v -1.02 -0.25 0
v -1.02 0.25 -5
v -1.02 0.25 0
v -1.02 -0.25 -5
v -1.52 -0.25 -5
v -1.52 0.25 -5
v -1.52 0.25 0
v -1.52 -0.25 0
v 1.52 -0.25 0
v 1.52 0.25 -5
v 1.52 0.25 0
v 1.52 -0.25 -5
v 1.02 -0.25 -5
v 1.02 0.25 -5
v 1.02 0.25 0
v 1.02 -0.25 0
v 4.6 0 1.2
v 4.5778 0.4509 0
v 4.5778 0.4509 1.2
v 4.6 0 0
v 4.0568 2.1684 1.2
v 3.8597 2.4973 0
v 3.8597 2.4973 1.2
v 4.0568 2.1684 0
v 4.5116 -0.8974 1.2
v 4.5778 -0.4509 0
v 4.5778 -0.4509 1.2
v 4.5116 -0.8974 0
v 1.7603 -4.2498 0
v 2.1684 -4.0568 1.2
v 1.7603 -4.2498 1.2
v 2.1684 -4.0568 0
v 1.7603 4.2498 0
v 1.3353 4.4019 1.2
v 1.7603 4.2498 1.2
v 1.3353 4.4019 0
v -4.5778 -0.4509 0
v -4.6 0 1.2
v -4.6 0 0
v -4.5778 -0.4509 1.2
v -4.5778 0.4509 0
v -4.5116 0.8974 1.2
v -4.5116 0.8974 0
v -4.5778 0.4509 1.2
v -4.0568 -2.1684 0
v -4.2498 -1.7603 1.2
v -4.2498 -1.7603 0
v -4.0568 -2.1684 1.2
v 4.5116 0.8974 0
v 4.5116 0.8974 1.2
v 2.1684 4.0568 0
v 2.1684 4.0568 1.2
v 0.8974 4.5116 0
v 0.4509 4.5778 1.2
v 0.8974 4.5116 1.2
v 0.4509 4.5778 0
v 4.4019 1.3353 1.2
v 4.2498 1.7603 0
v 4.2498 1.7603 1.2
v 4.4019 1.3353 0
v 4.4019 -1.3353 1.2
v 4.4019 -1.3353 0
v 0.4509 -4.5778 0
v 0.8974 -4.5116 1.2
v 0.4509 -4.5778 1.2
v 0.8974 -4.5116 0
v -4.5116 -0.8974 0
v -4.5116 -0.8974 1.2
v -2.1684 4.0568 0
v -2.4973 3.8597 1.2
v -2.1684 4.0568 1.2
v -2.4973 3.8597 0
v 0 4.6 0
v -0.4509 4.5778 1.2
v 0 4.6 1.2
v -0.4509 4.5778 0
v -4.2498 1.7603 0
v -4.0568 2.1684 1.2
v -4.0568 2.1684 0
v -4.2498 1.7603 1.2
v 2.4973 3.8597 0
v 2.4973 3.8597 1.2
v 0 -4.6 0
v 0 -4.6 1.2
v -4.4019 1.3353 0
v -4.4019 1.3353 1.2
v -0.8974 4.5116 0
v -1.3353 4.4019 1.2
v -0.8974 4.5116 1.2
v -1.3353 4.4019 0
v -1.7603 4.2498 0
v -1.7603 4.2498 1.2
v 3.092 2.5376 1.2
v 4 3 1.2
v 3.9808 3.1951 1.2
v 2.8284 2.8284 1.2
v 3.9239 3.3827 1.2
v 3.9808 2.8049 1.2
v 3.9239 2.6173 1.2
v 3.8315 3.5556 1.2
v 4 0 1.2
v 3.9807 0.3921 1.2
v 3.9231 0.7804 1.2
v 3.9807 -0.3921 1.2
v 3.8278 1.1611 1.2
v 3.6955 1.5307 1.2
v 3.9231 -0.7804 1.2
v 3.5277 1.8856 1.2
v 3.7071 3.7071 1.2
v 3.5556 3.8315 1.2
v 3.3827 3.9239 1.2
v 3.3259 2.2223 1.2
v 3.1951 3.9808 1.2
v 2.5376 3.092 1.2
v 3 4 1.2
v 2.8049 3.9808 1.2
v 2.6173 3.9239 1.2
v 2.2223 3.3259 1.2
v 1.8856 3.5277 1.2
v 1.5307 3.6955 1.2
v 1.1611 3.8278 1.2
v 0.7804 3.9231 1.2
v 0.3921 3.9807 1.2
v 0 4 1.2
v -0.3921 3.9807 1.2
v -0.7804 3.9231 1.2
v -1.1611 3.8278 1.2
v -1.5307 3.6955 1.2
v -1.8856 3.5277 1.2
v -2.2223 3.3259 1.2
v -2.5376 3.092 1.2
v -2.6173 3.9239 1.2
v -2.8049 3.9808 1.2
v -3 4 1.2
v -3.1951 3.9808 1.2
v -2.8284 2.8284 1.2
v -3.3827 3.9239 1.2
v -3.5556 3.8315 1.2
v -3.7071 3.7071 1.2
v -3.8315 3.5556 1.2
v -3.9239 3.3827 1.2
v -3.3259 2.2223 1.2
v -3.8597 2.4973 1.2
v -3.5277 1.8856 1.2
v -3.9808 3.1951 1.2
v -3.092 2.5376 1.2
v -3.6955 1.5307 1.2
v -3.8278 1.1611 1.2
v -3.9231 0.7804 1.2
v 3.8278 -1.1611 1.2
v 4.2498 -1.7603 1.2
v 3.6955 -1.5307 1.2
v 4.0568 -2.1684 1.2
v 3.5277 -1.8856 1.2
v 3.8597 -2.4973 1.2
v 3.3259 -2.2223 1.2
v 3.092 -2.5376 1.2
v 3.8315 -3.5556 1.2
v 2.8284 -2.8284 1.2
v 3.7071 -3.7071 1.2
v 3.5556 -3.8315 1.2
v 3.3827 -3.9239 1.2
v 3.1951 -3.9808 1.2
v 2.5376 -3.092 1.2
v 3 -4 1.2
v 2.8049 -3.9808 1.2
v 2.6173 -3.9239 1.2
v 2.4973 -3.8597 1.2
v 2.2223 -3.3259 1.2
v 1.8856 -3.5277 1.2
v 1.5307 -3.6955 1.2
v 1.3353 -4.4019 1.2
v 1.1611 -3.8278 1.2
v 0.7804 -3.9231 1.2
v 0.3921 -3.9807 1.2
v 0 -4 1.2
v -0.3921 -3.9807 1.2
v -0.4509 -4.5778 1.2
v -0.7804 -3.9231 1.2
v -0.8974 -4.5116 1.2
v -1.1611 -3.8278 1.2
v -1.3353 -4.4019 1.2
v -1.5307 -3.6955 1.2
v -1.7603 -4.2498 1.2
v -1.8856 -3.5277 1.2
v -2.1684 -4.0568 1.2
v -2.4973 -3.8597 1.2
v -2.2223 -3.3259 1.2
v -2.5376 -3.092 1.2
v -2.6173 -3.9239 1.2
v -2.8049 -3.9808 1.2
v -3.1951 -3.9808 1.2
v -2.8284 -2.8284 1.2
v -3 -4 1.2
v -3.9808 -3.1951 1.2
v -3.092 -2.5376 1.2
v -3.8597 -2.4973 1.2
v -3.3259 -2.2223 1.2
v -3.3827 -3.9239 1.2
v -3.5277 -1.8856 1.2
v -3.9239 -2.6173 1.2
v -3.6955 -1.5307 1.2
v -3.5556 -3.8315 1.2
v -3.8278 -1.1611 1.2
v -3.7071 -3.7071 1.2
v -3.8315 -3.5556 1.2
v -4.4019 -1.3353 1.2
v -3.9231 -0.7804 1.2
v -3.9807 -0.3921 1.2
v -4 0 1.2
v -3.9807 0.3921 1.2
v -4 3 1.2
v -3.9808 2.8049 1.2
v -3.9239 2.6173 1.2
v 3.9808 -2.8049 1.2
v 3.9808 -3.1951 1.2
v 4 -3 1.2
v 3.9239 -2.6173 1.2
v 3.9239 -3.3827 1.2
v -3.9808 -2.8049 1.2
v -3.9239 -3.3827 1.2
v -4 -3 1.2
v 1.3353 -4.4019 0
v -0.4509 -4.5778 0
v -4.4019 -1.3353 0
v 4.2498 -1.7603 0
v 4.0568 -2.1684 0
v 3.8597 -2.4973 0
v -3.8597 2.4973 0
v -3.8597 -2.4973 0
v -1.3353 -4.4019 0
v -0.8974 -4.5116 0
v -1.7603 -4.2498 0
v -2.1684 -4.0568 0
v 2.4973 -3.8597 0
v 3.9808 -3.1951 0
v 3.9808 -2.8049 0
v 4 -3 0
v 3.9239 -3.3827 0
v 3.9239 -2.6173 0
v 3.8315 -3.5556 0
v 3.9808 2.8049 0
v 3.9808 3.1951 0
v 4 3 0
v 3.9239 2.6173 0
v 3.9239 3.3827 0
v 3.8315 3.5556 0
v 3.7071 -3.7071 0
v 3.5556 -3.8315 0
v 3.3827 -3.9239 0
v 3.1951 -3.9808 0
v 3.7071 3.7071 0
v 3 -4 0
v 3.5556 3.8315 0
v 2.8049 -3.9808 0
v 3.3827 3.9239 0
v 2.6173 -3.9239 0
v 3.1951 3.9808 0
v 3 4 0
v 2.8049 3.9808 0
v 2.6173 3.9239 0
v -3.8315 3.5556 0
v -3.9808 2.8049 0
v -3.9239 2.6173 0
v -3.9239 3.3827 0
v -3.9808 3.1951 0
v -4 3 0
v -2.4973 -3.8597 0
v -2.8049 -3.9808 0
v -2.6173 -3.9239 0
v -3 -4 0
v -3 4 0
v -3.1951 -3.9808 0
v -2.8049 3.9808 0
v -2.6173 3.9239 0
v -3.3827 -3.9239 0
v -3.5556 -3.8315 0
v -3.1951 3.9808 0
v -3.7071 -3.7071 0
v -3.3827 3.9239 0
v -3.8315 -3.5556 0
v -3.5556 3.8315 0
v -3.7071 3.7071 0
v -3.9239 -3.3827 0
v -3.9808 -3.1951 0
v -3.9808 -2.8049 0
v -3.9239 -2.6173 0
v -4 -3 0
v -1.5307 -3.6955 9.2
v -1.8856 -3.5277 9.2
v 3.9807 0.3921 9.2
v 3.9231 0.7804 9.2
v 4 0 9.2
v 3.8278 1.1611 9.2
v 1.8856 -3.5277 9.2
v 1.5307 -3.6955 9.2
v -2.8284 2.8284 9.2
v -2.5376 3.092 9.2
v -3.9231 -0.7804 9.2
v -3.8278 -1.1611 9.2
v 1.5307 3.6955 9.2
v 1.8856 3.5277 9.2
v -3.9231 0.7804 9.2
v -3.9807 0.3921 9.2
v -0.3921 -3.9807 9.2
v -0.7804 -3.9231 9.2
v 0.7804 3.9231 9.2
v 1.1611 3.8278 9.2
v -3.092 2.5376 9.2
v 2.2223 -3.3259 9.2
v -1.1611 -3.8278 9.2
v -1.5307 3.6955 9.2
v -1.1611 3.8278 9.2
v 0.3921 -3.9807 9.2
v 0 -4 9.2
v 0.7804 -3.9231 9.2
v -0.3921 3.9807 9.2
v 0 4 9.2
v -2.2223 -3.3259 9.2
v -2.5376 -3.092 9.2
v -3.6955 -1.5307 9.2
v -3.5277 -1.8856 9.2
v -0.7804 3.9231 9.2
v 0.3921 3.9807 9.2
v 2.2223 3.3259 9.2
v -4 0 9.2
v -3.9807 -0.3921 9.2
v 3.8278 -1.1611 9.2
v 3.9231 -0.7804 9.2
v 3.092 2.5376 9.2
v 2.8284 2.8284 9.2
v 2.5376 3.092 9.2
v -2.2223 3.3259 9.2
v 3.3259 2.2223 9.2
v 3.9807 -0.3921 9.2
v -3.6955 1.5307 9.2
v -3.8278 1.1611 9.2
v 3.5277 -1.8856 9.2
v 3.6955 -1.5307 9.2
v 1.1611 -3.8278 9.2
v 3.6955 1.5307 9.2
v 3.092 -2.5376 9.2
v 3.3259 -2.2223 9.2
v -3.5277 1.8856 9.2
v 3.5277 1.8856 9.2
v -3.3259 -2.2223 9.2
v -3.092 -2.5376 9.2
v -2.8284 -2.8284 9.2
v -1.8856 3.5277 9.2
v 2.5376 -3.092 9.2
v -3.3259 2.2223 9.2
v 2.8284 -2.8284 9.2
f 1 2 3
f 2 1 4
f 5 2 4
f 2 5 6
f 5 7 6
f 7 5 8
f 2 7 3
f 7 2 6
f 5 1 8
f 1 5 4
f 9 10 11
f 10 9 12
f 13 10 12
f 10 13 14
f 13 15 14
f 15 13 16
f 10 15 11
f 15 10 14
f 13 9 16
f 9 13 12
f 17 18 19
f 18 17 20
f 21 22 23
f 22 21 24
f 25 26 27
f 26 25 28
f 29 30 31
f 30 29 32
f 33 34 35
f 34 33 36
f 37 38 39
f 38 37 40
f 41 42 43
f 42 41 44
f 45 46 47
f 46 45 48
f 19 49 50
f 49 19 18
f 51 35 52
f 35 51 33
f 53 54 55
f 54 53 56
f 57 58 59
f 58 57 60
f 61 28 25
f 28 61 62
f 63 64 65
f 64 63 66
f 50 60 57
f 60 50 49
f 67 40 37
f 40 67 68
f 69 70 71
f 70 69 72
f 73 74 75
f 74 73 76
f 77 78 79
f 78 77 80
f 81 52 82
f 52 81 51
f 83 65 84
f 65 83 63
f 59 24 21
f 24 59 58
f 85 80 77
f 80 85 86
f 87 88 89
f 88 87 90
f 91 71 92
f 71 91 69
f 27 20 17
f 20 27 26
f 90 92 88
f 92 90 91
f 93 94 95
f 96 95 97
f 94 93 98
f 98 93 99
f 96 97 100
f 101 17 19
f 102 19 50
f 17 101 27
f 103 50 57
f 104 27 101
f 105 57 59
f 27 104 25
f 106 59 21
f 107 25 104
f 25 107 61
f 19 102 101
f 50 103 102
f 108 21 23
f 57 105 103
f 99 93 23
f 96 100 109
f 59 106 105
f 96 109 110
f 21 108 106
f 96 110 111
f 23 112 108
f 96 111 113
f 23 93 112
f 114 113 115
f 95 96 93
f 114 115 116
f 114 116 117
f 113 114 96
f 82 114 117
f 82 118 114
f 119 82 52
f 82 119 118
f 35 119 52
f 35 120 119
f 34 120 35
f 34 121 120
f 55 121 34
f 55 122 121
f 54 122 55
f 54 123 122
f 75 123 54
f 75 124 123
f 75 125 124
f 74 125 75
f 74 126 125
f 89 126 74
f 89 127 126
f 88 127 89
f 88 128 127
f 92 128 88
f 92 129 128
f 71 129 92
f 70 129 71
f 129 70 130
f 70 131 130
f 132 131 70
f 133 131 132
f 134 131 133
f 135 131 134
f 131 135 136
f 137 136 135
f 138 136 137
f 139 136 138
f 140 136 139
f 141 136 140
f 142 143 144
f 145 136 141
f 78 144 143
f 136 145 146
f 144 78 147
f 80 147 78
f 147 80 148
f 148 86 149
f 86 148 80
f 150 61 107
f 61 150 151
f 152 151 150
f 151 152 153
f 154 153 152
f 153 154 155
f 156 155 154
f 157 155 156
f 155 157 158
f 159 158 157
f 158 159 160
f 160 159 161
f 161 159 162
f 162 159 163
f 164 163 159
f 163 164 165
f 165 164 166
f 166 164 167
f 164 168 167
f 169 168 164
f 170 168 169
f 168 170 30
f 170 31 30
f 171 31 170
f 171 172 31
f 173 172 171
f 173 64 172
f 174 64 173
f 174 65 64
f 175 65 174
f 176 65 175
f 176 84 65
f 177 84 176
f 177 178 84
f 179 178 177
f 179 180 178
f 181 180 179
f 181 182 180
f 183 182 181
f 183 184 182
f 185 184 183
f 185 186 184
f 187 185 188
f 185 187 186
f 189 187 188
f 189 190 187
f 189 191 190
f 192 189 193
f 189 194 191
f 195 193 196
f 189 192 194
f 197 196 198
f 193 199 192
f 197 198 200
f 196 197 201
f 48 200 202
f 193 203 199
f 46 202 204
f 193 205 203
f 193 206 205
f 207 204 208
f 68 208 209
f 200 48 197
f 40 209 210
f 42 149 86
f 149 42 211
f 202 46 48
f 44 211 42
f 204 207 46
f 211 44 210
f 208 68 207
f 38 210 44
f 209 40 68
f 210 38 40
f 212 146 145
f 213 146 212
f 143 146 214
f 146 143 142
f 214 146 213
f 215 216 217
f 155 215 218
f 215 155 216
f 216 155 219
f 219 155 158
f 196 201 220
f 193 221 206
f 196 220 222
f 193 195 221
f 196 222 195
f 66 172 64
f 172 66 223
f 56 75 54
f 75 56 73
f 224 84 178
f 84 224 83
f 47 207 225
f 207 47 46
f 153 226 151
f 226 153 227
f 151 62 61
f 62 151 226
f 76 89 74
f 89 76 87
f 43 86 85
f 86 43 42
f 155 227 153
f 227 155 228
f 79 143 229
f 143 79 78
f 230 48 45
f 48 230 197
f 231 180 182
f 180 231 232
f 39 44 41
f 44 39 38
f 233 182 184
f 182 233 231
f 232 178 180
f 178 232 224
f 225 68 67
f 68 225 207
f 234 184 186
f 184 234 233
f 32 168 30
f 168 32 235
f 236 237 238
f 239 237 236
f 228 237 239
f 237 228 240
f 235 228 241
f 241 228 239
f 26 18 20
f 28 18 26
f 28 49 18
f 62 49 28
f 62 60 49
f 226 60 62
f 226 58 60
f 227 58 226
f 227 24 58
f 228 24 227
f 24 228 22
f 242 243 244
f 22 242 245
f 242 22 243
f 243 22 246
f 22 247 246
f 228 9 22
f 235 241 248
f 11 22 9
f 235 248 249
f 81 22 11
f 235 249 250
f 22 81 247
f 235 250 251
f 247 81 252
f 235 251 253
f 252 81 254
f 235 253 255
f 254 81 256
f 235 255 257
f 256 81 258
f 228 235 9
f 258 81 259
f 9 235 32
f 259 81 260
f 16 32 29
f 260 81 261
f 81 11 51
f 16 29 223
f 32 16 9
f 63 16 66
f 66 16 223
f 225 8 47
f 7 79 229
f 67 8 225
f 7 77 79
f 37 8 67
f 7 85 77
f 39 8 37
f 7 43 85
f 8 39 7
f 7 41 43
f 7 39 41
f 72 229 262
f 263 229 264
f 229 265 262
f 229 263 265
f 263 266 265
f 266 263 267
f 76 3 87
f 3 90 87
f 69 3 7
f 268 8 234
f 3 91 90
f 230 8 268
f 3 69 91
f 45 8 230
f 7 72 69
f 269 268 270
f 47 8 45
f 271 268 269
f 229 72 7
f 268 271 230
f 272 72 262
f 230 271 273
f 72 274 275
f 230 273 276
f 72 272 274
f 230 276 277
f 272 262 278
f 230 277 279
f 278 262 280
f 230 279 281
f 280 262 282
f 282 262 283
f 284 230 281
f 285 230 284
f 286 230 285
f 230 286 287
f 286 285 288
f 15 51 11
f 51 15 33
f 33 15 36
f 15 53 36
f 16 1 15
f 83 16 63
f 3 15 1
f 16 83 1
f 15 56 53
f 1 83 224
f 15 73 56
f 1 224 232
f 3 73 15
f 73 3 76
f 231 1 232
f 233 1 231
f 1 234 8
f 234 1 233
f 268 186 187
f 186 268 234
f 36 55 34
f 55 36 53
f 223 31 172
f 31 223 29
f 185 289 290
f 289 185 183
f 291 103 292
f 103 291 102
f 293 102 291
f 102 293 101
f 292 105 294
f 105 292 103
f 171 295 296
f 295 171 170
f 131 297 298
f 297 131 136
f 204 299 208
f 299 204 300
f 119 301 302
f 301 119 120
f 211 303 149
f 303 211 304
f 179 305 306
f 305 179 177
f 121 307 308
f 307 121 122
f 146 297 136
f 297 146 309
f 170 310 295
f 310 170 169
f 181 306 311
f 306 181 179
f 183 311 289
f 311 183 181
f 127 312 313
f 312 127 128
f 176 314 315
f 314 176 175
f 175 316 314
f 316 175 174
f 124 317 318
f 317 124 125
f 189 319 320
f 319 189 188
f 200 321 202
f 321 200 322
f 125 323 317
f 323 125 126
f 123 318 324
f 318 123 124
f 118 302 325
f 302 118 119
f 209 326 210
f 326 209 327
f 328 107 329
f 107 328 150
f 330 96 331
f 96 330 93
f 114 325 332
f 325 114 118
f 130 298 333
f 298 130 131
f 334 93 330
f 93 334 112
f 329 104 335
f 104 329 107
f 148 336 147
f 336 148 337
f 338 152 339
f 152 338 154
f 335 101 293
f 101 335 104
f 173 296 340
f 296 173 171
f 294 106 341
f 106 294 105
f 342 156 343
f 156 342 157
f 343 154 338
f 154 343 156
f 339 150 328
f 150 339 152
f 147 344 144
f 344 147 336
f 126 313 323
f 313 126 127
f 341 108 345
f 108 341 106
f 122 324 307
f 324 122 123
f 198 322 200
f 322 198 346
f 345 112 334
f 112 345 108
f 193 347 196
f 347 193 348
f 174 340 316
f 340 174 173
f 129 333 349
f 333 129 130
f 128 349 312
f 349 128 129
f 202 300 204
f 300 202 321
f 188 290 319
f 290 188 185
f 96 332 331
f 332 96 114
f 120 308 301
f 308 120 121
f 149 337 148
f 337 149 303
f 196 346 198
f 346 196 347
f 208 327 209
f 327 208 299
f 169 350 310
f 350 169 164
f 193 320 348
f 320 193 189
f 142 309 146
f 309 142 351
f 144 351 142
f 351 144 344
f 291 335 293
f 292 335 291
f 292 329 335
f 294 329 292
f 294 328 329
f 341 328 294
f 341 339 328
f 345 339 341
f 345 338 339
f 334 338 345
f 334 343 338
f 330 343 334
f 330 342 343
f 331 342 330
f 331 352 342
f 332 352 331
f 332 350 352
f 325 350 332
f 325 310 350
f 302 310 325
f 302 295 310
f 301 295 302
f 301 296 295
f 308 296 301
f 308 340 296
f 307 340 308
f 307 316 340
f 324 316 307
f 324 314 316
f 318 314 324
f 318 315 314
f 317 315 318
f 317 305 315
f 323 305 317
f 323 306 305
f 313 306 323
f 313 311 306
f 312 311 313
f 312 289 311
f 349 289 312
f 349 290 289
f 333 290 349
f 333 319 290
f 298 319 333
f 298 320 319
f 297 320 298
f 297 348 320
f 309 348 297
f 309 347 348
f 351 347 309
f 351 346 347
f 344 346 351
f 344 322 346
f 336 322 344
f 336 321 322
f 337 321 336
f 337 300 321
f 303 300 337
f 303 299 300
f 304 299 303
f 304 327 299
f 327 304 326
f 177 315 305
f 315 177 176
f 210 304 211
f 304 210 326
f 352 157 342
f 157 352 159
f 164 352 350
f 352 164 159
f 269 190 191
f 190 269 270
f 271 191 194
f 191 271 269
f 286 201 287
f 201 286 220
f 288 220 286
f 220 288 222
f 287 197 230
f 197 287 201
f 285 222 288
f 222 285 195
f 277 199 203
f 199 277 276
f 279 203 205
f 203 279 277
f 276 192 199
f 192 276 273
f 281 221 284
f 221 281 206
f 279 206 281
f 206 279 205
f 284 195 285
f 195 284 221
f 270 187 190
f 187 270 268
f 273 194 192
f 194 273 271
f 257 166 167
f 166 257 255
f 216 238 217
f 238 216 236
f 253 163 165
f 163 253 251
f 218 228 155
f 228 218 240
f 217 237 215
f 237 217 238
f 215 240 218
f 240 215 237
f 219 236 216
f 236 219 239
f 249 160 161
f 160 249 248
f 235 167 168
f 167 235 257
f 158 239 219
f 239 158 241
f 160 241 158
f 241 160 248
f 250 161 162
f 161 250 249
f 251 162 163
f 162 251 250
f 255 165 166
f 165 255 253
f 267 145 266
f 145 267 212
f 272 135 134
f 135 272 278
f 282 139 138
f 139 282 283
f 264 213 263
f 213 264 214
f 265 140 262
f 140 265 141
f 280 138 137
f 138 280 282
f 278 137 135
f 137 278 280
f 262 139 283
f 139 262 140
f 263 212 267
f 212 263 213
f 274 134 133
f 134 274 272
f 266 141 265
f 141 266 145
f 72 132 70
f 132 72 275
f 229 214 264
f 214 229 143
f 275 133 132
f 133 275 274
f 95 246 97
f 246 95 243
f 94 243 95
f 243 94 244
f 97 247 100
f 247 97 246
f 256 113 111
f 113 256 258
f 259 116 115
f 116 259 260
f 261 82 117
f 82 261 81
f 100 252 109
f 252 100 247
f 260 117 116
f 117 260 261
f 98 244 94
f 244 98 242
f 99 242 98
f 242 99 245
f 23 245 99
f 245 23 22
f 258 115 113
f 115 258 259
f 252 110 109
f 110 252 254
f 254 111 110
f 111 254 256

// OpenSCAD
// Parameters
led_diameter_mm = 8; //[4:16:0.1]
body_height_mm = 9.2; //[4.6:18.4:0.1]
rim_thickness_mm = 1.2; //[0.6:2.4:0.1]
rim_diameter_mm = 9.2; //[8.4:14:0.1]
lead_thickness_mm = 0.5; //[0.3:1:0.05]
lead_pitch_mm = 2.54; //[1.5:5.08:0.01]
lead_length_mm = 5; //[2.5:15:0.1]
right_angle = 0; //[0:10:1]
overlap_mm = 1.2; //[0.2:2:0.1]
grill_width_mm = 12; //[6:30:0.5]
grill_height_mm = 12; //[6:30:0.5]
grill_hole_mm = 2; //[1:5:0.1]
grill_gap_mm = 1; //[0.5:4:0.1]
grill_r_mm = 1000; //[20:2000:10]

// LED - complete geometry (fixed connectivity)
module led() {
  // Z references:
  // Rim spans: z = [0 .. rim_thickness_mm]
  // Body spans: z = [rim_thickness_mm - overlap_mm .. rim_thickness_mm - overlap_mm + body_height_mm]
  // Leads span: z = [-(lead_length_mm) .. rim_thickness_mm + overlap_mm]  (overlaps into rim by overlap_mm)

  color("red")
  union() {
    // LED Rim (base at z=0)
    translate([0, 0, rim_thickness_mm/2])
      cylinder(r=rim_diameter_mm/2, h=rim_thickness_mm, center=true, $fn=64);

    // LED Body (overlaps into rim by overlap_mm)
    translate([0, 0, (rim_thickness_mm - overlap_mm) + body_height_mm/2])
      cylinder(r=led_diameter_mm/2, h=body_height_mm, center=true, $fn=64);

    // Leads (extend up into rim by overlap_mm to guarantee attachment)
    // Place as a single solid union with the body/rim
    for (sx = [-1, 1]) {
      translate([sx*lead_pitch_mm/2, 0, (-lead_length_mm + (rim_thickness_mm + overlap_mm))/2])
        cube([lead_thickness_mm, lead_thickness_mm, lead_length_mm + rim_thickness_mm + overlap_mm], center=true);
    }

    // Optional Right Angle Bend (kept connected to the vertical leads)
    if (right_angle > 0) {
      for (sx = [-1, 1]) {
        // Bend starts at the bottom end of the vertical lead (z = -lead_length_mm)
        // Overlap slightly into the vertical lead by overlap_mm
        translate([sx*lead_pitch_mm/2,
                   -(right_angle/2 + lead_thickness_mm/2 - overlap_mm),
                   -lead_length_mm + lead_thickness_mm/2])
          cube([lead_thickness_mm, right_angle, lead_thickness_mm], center=true);
      }
    }
  }
}

// Grill Hole Positions - complete geometry
module grill_hole_positions() {
  color("Silver") {
    union() {
      translate([-grill_width_mm/4, -grill_height_mm/4, rim_thickness_mm/2])
        cylinder(r=grill_hole_mm/2, h=rim_thickness_mm, center=true, $fn=32);
      translate([grill_width_mm/4, -grill_height_mm/4, rim_thickness_mm/2])
        cylinder(r=grill_hole_mm/2, h=rim_thickness_mm, center=true, $fn=32);
      translate([-grill_width_mm/4, grill_height_mm/4, rim_thickness_mm/2])
        cylinder(r=grill_hole_mm/2, h=rim_thickness_mm, center=true, $fn=32);
      translate([grill_width_mm/4, grill_height_mm/4, rim_thickness_mm/2])
        cylinder(r=grill_hole_mm/2, h=rim_thickness_mm, center=true, $fn=32);
    }
  }
}

// Assembly
module assembly() {
  union() {
    led();
    grill_hole_positions();
  }
}

assembly();
